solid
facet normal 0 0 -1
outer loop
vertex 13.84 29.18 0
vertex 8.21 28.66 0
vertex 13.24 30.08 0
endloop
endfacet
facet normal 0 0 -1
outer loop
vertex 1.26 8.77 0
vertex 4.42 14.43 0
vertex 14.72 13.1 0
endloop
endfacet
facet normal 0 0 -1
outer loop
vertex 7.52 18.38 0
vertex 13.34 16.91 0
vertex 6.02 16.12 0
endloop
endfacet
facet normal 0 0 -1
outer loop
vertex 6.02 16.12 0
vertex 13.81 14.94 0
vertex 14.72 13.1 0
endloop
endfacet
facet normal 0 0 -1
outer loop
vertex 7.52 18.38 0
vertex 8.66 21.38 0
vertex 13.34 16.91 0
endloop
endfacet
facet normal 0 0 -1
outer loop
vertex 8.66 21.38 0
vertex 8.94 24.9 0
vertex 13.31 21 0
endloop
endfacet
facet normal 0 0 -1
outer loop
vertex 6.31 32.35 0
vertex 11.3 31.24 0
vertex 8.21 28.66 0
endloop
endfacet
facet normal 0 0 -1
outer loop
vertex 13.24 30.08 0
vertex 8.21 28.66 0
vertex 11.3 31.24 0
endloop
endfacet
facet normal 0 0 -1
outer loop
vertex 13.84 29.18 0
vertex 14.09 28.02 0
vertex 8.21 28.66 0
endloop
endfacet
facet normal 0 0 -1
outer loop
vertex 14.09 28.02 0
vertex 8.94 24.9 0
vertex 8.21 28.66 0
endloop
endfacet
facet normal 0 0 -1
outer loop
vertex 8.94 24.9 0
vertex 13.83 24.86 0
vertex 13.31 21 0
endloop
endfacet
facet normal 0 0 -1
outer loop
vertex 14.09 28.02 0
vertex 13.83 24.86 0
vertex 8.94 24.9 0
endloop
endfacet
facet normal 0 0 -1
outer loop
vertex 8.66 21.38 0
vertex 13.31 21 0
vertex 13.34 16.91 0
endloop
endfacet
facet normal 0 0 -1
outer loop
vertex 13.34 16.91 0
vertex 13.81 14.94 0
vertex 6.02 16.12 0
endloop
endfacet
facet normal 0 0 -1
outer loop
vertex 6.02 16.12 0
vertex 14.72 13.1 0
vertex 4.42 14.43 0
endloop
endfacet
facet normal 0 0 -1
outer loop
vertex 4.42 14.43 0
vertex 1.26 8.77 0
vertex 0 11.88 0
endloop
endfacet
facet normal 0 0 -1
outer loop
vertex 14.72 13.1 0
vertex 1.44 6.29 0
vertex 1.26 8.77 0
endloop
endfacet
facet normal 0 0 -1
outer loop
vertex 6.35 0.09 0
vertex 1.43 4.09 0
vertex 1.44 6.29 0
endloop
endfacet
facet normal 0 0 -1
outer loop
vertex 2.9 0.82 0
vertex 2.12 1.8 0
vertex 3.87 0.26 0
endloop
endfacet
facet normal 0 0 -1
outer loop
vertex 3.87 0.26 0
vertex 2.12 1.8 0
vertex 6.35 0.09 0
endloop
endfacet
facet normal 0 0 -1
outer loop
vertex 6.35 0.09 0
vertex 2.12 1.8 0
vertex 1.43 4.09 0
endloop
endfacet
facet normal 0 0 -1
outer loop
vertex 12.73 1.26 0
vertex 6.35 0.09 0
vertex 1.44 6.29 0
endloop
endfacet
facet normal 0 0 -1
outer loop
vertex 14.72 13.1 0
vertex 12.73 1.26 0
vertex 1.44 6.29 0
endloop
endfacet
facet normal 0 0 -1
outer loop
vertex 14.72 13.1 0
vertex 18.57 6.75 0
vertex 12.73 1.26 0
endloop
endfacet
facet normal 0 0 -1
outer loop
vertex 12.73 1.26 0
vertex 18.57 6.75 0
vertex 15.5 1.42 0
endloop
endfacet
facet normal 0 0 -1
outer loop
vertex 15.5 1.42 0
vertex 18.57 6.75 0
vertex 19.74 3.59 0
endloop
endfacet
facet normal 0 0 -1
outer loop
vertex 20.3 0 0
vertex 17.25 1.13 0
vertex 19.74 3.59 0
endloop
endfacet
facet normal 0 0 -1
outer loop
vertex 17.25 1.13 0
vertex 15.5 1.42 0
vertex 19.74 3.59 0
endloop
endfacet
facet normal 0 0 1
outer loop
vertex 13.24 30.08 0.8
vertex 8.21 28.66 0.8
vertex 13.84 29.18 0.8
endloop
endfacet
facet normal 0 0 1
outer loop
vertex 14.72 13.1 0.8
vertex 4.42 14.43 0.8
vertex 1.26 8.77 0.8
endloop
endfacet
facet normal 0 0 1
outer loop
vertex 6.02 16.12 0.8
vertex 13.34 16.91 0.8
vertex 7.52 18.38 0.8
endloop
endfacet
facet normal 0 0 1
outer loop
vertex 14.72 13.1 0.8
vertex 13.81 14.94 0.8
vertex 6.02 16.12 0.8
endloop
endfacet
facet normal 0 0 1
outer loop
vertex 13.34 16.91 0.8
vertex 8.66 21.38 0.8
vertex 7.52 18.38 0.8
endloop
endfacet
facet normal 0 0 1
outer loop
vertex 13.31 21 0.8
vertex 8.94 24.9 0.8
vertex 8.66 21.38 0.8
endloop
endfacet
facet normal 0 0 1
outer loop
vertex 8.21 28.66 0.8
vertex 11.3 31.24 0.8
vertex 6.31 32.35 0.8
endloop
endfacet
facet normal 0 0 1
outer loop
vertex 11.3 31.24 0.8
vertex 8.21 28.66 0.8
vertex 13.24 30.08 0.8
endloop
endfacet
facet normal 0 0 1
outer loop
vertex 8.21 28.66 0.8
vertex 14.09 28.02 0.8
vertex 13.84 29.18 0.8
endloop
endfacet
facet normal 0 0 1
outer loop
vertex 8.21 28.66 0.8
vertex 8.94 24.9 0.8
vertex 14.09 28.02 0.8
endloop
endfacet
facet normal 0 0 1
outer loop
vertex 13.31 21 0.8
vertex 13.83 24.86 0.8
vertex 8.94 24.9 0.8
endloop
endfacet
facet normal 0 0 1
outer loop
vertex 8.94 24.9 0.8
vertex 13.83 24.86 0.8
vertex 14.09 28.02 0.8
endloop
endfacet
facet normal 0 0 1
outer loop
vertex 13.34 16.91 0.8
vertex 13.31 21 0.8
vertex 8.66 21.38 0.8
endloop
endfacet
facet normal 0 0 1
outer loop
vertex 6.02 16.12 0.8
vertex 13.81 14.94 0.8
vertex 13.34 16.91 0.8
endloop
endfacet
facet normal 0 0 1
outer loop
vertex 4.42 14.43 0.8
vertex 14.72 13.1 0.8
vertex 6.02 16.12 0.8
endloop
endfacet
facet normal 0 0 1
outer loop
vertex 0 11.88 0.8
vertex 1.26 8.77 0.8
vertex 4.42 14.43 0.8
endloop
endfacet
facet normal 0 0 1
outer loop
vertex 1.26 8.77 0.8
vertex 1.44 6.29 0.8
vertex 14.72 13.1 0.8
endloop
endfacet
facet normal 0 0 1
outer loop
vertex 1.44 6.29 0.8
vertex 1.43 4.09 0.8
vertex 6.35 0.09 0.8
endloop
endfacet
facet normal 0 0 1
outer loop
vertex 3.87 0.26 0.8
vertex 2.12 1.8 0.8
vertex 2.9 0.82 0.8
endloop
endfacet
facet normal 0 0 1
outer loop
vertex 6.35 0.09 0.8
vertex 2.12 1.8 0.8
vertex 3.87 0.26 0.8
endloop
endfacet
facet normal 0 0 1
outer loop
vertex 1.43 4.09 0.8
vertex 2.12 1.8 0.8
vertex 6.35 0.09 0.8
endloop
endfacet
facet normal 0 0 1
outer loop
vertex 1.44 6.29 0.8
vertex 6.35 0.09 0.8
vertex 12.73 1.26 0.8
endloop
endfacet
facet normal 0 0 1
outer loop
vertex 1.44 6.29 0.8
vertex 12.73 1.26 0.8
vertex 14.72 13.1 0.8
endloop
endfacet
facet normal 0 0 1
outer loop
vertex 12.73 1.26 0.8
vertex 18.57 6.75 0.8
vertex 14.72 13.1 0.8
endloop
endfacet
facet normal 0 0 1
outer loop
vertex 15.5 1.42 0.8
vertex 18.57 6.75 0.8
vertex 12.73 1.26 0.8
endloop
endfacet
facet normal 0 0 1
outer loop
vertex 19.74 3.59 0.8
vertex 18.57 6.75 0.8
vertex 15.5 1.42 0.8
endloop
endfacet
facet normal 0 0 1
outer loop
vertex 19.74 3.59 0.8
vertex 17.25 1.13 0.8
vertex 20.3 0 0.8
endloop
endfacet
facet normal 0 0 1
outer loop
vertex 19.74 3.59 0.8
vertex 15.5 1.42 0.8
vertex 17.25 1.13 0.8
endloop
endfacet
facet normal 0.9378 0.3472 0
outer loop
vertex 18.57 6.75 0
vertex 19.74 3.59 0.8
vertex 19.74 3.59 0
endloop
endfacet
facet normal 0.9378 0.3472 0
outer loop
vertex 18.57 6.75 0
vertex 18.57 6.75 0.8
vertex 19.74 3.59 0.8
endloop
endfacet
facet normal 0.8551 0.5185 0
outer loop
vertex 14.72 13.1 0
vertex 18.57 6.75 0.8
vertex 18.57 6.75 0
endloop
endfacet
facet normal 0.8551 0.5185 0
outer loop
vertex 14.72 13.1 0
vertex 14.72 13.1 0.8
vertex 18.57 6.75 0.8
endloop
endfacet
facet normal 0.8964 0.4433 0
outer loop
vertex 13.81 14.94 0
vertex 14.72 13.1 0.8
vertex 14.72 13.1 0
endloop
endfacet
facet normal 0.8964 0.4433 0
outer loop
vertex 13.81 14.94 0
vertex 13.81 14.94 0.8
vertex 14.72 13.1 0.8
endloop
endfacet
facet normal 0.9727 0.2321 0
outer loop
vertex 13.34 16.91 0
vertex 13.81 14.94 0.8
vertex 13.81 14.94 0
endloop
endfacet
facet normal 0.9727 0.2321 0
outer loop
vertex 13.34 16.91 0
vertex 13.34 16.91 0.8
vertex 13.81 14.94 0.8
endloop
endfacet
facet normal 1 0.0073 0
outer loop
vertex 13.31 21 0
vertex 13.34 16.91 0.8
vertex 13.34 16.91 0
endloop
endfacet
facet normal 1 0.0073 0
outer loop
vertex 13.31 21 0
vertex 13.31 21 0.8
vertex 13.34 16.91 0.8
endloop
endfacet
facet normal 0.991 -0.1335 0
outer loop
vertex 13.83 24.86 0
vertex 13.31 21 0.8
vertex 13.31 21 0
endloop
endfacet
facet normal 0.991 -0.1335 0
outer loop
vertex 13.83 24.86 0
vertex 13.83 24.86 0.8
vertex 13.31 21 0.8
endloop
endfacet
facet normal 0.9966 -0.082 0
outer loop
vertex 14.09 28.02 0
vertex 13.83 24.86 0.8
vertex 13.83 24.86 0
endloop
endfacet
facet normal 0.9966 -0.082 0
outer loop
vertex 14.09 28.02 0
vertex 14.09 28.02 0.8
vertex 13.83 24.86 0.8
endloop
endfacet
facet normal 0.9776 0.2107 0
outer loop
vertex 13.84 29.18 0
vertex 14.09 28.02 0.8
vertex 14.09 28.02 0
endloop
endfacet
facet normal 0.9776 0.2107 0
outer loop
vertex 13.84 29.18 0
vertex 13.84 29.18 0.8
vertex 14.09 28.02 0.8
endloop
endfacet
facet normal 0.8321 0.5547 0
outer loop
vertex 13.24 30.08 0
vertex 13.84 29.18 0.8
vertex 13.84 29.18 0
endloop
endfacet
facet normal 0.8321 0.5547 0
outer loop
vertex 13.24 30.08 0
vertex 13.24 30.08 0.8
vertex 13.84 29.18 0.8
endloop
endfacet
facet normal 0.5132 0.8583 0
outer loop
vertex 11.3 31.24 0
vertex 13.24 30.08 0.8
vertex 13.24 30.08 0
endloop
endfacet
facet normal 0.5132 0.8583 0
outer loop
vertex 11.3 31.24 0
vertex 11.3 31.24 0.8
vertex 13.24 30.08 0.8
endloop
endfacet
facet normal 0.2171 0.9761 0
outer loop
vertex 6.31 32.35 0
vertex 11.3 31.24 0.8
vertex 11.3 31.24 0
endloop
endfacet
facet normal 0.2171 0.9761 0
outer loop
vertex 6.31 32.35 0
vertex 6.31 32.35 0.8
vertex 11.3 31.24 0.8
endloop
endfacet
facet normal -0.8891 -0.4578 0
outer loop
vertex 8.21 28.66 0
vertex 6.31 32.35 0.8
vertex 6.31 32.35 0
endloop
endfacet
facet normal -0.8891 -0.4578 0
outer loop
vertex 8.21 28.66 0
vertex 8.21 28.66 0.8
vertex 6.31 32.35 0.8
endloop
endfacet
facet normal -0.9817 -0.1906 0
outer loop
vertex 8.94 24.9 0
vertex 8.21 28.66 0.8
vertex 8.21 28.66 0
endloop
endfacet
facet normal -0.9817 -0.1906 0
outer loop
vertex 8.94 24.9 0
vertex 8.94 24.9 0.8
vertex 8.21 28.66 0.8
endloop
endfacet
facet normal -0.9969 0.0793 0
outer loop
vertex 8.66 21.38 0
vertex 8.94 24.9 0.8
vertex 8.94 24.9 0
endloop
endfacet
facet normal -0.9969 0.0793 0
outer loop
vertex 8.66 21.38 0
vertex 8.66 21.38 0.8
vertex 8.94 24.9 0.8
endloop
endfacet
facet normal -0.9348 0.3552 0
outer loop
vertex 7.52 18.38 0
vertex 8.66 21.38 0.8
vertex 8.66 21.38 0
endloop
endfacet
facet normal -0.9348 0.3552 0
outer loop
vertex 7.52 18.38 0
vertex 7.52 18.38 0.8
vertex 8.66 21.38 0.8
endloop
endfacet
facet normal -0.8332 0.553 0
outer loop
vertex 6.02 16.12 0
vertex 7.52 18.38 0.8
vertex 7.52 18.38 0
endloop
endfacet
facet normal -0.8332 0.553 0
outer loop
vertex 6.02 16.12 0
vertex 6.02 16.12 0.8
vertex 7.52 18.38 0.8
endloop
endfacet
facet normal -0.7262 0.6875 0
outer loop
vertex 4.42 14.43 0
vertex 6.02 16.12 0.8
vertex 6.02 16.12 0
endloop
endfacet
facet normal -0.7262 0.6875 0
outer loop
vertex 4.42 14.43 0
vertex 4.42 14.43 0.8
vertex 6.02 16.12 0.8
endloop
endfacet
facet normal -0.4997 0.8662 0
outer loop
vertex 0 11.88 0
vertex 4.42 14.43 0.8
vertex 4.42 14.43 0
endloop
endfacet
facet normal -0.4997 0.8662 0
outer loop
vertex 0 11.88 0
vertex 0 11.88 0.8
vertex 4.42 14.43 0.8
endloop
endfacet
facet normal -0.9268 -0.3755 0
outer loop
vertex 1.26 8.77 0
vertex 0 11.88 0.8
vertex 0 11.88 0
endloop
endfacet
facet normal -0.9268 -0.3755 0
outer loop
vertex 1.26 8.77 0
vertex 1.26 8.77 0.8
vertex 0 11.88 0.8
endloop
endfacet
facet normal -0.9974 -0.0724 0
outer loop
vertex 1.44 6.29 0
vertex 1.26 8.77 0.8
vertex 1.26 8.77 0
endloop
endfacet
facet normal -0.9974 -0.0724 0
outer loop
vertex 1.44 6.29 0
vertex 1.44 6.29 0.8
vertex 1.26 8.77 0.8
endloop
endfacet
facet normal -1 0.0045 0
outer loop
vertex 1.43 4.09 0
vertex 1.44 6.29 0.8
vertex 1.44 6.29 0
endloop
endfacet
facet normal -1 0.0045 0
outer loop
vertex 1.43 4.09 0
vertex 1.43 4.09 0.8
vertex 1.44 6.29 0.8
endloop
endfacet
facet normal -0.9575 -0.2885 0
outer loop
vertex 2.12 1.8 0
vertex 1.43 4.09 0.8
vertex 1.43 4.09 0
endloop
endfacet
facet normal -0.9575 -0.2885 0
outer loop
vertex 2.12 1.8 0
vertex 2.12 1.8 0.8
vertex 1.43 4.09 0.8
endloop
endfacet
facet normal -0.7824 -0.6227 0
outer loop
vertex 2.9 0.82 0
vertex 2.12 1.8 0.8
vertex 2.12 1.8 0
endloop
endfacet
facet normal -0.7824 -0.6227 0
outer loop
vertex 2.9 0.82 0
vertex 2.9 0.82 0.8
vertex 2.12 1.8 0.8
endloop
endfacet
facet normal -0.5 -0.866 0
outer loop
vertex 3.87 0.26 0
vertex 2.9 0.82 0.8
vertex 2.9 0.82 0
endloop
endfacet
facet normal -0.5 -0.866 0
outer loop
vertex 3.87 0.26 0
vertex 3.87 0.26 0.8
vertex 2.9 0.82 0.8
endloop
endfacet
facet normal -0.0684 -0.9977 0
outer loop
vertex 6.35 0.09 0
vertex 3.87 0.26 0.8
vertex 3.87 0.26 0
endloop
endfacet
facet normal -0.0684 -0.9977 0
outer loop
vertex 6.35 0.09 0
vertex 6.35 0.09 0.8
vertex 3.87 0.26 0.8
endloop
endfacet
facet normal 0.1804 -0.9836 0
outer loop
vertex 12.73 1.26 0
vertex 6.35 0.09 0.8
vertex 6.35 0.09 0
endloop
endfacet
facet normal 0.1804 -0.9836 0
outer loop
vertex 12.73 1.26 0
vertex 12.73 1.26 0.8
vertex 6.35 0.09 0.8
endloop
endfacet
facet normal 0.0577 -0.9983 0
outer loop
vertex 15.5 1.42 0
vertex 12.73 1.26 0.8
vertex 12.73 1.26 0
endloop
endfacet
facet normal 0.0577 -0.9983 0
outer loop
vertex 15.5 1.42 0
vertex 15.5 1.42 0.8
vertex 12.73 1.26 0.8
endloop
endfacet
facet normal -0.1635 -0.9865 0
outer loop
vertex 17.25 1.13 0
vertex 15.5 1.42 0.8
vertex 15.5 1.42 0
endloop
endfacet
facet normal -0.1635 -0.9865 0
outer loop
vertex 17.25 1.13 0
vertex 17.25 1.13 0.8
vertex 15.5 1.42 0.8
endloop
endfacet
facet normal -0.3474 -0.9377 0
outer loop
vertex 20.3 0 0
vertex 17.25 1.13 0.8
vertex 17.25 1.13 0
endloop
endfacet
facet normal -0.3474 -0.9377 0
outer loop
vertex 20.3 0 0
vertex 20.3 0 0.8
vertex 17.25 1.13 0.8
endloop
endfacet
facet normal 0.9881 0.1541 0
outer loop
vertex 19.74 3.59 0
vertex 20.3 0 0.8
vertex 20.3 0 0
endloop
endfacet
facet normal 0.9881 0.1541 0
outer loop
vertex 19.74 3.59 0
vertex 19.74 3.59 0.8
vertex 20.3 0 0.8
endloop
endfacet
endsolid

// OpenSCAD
// file: generated_guitarHook.scad
// Generated by "ink2scad" inkscape extension. http://nickthecoder.co.uk/software/view/ink2scad
//
// Names are based on the inkscape path's id. Use Shift+Ctrl++O in inkscape to edit the paths' ids.
// For each inkscape path, a variable is created, which defines the path. The data takes the form :
//
//     [ points, paths, [ox,oy], [width,height] ]
//
//     points         : An array of 2D coordinates. Passed to polygon's 'points' parameter.
//     paths          : An array of array of integers. Passed to polygon's 'paths' parameter.
//     [width,height] : The size of the path's bounding box.
//     [left,bottom]  : The position of the path's bottom left corner (When exporting more than one object).
//
// Example simple extrusions : :
//     linear_extrude( height = 10 ) ink2scad( myshape );
//

// Creates a 2D polygon from the data generated by the ink2scad inkscape plugin.
//
// data        : The definition of your shape (see header above for details)
// center      : If true, the polygon is create centered at (0,0)
// relative    : If true, the polygon is created at a position relative to the other generated objects 
// convexity   : Only used during openSCAD's preview mode
//
module ink2scad( data, center=false, relativeTo, convexity=4 )
{
    if ( center ) {
        translate( -data[2]/2 ) polygon( points=data[0], paths=data[1], convexity=convexity );
    } else {
        if ( relativeTo ) {
            translate( data[3] - relativeTo[3] ) polygon( points=data[0], paths=data[1], convexity=convexity );
        } else {
            polygon( points=data[0], paths=data[1], convexity=convexity );
        }
    }
}

//
// Example usage :
// linear_extrude( 10 ) ink2scad( myshape, center=true );
//

bridge2 = [
    [ [0,1.44], [15.47,2.04], [15.52,0.60], [0.06,0] ],
    [ [3,2,1,0] ],
    [15.52,2.04],
    [99.46,-179.58]
];


pickGuard = [
    [ [6.31,32.35], [8.21,28.66], [8.94,24.90], [8.66,21.38], [7.52,18.38], [6.02,16.12], [4.42,14.43], [0,11.88], [1.26,8.77], [1.44,6.29], [1.43,4.09], [2.12,1.80], [2.90,0.82], [3.87,0.26], [6.35,0.09], [12.73,1.26], [15.50,1.42], [17.25,1.13], [20.30,0], [19.74,3.59], [18.57,6.75], [14.72,13.10], [13.81,14.94], [13.34,16.91], [13.31,21], [13.83,24.86], [14.09,28.02], [13.84,29.18], [13.24,30.08], [11.30,31.24] ],
    [ [0,1,2,3,4,5,6,7,8,9,10,11,12,13,14,15,16,17,18,19,20,21,22,23,24,25,26,27,28,29] ],
    [20.30,32.35],
    [111.38,-173.54]
];


body = [
    [ [33.83,100.14], [29.20,99.81], [24.44,99.09], [19.79,97.68], [15.49,95.29], [13.21,93.15], [11.71,90.81], [10.84,88.38], [10.47,85.97], [10.64,81.64], [11.07,78.66], [12.07,71.92], [12.40,68.24], [12.21,63.62], [11.23,58.66], [9.46,53.95], [4.14,43.43], [1.58,36.85], [0.53,32.37], [0,27.40], [0.27,22.14], [1.63,16.80], [4.34,11.60], [8.68,6.76], [11.91,4.44], [15.51,2.72], [19.37,1.50], [23.37,0.70], [31.34,0.01], [38.47,0], [45.44,0.08], [53.12,0.70], [57.03,1.47], [60.87,2.69], [64.56,4.46], [68.04,6.89], [72.61,11.63], [75.57,16.69], [77.18,21.87], [77.72,26.97], [77.45,31.81], [76.65,36.19], [74.55,42.78], [71.93,48.24], [69.39,52.71], [67.30,57.33], [66.06,63.25], [66.04,67.08], [66.53,70.88], [67.70,78.37], [67.93,81.47], [67.69,86.07], [67.10,88.62], [66.04,91.17], [64.40,93.59], [62.07,95.76], [57.66,98.10], [52.88,99.37], [48.27,99.93], [44.37,100.14] ],
    [ [0,1,2,3,4,5,6,7,8,9,10,11,12,13,14,15,16,17,18,19,20,21,22,23,24,25,26,27,28,29,30,31,32,33,34,35,36,37,38,39,40,41,42,43,44,45,46,47,48,49,50,51,52,53,54,55,56,57,58,59] ],
    [77.72,100.14],
    [67.70,-218.10]
];


neck = [
    [ [0.86,25.95], [11.91,25.90], [12.39,0], [0,0.09] ],
    [ [3,2,1,0] ],
    [12.39,25.95],
    [100.97,-138.04]
];


rect2998 = [
    [ [0,6.98], [7.18,6.98], [7.18,0], [0,0] ],
    [ [3,2,1,0] ],
    [7.18,6.98],
    [22.15,-101.63]
];


bridge = [
    [ [2.09,10.23], [0,3.54], [2.51,3.59], [4.66,3.27], [8.36,1.98], [12.12,0.58], [16.96,0], [21.92,0.80], [25.91,2.32], [29.80,3.61], [31.97,3.88], [34.42,3.74], [32.22,10.13], [28.06,9.19], [24.55,8.84], [17.27,8.75], [9.88,8.87], [6.29,9.25] ],
    [ [0,1,2,3,4,5,6,7,8,9,10,11,12,13,14,15,16,17] ],
    [34.42,10.23],
    [89.90,-185.05]
];


soundHole = [
    [ [20.36,10.18], [19.56,6.22], [17.37,2.98], [14.14,0.80], [10.18,0], [6.22,0.80], [2.98,2.98], [0.80,6.22], [0,10.18], [0.80,14.14], [2.98,17.37], [6.22,19.56], [10.18,20.36], [14.14,19.56], [17.37,17.37], [19.56,14.14] ],
    [ [15,14,13,12,11,10,9,8,7,6,5,4,3,2,1,0] ],
    [20.36,20.36],
    [97.39,-159.10]
];
// main file
include <generated_guitarHook.scad>;

linear_extrude( 0.8 ) ink2scad( pickGuard );
